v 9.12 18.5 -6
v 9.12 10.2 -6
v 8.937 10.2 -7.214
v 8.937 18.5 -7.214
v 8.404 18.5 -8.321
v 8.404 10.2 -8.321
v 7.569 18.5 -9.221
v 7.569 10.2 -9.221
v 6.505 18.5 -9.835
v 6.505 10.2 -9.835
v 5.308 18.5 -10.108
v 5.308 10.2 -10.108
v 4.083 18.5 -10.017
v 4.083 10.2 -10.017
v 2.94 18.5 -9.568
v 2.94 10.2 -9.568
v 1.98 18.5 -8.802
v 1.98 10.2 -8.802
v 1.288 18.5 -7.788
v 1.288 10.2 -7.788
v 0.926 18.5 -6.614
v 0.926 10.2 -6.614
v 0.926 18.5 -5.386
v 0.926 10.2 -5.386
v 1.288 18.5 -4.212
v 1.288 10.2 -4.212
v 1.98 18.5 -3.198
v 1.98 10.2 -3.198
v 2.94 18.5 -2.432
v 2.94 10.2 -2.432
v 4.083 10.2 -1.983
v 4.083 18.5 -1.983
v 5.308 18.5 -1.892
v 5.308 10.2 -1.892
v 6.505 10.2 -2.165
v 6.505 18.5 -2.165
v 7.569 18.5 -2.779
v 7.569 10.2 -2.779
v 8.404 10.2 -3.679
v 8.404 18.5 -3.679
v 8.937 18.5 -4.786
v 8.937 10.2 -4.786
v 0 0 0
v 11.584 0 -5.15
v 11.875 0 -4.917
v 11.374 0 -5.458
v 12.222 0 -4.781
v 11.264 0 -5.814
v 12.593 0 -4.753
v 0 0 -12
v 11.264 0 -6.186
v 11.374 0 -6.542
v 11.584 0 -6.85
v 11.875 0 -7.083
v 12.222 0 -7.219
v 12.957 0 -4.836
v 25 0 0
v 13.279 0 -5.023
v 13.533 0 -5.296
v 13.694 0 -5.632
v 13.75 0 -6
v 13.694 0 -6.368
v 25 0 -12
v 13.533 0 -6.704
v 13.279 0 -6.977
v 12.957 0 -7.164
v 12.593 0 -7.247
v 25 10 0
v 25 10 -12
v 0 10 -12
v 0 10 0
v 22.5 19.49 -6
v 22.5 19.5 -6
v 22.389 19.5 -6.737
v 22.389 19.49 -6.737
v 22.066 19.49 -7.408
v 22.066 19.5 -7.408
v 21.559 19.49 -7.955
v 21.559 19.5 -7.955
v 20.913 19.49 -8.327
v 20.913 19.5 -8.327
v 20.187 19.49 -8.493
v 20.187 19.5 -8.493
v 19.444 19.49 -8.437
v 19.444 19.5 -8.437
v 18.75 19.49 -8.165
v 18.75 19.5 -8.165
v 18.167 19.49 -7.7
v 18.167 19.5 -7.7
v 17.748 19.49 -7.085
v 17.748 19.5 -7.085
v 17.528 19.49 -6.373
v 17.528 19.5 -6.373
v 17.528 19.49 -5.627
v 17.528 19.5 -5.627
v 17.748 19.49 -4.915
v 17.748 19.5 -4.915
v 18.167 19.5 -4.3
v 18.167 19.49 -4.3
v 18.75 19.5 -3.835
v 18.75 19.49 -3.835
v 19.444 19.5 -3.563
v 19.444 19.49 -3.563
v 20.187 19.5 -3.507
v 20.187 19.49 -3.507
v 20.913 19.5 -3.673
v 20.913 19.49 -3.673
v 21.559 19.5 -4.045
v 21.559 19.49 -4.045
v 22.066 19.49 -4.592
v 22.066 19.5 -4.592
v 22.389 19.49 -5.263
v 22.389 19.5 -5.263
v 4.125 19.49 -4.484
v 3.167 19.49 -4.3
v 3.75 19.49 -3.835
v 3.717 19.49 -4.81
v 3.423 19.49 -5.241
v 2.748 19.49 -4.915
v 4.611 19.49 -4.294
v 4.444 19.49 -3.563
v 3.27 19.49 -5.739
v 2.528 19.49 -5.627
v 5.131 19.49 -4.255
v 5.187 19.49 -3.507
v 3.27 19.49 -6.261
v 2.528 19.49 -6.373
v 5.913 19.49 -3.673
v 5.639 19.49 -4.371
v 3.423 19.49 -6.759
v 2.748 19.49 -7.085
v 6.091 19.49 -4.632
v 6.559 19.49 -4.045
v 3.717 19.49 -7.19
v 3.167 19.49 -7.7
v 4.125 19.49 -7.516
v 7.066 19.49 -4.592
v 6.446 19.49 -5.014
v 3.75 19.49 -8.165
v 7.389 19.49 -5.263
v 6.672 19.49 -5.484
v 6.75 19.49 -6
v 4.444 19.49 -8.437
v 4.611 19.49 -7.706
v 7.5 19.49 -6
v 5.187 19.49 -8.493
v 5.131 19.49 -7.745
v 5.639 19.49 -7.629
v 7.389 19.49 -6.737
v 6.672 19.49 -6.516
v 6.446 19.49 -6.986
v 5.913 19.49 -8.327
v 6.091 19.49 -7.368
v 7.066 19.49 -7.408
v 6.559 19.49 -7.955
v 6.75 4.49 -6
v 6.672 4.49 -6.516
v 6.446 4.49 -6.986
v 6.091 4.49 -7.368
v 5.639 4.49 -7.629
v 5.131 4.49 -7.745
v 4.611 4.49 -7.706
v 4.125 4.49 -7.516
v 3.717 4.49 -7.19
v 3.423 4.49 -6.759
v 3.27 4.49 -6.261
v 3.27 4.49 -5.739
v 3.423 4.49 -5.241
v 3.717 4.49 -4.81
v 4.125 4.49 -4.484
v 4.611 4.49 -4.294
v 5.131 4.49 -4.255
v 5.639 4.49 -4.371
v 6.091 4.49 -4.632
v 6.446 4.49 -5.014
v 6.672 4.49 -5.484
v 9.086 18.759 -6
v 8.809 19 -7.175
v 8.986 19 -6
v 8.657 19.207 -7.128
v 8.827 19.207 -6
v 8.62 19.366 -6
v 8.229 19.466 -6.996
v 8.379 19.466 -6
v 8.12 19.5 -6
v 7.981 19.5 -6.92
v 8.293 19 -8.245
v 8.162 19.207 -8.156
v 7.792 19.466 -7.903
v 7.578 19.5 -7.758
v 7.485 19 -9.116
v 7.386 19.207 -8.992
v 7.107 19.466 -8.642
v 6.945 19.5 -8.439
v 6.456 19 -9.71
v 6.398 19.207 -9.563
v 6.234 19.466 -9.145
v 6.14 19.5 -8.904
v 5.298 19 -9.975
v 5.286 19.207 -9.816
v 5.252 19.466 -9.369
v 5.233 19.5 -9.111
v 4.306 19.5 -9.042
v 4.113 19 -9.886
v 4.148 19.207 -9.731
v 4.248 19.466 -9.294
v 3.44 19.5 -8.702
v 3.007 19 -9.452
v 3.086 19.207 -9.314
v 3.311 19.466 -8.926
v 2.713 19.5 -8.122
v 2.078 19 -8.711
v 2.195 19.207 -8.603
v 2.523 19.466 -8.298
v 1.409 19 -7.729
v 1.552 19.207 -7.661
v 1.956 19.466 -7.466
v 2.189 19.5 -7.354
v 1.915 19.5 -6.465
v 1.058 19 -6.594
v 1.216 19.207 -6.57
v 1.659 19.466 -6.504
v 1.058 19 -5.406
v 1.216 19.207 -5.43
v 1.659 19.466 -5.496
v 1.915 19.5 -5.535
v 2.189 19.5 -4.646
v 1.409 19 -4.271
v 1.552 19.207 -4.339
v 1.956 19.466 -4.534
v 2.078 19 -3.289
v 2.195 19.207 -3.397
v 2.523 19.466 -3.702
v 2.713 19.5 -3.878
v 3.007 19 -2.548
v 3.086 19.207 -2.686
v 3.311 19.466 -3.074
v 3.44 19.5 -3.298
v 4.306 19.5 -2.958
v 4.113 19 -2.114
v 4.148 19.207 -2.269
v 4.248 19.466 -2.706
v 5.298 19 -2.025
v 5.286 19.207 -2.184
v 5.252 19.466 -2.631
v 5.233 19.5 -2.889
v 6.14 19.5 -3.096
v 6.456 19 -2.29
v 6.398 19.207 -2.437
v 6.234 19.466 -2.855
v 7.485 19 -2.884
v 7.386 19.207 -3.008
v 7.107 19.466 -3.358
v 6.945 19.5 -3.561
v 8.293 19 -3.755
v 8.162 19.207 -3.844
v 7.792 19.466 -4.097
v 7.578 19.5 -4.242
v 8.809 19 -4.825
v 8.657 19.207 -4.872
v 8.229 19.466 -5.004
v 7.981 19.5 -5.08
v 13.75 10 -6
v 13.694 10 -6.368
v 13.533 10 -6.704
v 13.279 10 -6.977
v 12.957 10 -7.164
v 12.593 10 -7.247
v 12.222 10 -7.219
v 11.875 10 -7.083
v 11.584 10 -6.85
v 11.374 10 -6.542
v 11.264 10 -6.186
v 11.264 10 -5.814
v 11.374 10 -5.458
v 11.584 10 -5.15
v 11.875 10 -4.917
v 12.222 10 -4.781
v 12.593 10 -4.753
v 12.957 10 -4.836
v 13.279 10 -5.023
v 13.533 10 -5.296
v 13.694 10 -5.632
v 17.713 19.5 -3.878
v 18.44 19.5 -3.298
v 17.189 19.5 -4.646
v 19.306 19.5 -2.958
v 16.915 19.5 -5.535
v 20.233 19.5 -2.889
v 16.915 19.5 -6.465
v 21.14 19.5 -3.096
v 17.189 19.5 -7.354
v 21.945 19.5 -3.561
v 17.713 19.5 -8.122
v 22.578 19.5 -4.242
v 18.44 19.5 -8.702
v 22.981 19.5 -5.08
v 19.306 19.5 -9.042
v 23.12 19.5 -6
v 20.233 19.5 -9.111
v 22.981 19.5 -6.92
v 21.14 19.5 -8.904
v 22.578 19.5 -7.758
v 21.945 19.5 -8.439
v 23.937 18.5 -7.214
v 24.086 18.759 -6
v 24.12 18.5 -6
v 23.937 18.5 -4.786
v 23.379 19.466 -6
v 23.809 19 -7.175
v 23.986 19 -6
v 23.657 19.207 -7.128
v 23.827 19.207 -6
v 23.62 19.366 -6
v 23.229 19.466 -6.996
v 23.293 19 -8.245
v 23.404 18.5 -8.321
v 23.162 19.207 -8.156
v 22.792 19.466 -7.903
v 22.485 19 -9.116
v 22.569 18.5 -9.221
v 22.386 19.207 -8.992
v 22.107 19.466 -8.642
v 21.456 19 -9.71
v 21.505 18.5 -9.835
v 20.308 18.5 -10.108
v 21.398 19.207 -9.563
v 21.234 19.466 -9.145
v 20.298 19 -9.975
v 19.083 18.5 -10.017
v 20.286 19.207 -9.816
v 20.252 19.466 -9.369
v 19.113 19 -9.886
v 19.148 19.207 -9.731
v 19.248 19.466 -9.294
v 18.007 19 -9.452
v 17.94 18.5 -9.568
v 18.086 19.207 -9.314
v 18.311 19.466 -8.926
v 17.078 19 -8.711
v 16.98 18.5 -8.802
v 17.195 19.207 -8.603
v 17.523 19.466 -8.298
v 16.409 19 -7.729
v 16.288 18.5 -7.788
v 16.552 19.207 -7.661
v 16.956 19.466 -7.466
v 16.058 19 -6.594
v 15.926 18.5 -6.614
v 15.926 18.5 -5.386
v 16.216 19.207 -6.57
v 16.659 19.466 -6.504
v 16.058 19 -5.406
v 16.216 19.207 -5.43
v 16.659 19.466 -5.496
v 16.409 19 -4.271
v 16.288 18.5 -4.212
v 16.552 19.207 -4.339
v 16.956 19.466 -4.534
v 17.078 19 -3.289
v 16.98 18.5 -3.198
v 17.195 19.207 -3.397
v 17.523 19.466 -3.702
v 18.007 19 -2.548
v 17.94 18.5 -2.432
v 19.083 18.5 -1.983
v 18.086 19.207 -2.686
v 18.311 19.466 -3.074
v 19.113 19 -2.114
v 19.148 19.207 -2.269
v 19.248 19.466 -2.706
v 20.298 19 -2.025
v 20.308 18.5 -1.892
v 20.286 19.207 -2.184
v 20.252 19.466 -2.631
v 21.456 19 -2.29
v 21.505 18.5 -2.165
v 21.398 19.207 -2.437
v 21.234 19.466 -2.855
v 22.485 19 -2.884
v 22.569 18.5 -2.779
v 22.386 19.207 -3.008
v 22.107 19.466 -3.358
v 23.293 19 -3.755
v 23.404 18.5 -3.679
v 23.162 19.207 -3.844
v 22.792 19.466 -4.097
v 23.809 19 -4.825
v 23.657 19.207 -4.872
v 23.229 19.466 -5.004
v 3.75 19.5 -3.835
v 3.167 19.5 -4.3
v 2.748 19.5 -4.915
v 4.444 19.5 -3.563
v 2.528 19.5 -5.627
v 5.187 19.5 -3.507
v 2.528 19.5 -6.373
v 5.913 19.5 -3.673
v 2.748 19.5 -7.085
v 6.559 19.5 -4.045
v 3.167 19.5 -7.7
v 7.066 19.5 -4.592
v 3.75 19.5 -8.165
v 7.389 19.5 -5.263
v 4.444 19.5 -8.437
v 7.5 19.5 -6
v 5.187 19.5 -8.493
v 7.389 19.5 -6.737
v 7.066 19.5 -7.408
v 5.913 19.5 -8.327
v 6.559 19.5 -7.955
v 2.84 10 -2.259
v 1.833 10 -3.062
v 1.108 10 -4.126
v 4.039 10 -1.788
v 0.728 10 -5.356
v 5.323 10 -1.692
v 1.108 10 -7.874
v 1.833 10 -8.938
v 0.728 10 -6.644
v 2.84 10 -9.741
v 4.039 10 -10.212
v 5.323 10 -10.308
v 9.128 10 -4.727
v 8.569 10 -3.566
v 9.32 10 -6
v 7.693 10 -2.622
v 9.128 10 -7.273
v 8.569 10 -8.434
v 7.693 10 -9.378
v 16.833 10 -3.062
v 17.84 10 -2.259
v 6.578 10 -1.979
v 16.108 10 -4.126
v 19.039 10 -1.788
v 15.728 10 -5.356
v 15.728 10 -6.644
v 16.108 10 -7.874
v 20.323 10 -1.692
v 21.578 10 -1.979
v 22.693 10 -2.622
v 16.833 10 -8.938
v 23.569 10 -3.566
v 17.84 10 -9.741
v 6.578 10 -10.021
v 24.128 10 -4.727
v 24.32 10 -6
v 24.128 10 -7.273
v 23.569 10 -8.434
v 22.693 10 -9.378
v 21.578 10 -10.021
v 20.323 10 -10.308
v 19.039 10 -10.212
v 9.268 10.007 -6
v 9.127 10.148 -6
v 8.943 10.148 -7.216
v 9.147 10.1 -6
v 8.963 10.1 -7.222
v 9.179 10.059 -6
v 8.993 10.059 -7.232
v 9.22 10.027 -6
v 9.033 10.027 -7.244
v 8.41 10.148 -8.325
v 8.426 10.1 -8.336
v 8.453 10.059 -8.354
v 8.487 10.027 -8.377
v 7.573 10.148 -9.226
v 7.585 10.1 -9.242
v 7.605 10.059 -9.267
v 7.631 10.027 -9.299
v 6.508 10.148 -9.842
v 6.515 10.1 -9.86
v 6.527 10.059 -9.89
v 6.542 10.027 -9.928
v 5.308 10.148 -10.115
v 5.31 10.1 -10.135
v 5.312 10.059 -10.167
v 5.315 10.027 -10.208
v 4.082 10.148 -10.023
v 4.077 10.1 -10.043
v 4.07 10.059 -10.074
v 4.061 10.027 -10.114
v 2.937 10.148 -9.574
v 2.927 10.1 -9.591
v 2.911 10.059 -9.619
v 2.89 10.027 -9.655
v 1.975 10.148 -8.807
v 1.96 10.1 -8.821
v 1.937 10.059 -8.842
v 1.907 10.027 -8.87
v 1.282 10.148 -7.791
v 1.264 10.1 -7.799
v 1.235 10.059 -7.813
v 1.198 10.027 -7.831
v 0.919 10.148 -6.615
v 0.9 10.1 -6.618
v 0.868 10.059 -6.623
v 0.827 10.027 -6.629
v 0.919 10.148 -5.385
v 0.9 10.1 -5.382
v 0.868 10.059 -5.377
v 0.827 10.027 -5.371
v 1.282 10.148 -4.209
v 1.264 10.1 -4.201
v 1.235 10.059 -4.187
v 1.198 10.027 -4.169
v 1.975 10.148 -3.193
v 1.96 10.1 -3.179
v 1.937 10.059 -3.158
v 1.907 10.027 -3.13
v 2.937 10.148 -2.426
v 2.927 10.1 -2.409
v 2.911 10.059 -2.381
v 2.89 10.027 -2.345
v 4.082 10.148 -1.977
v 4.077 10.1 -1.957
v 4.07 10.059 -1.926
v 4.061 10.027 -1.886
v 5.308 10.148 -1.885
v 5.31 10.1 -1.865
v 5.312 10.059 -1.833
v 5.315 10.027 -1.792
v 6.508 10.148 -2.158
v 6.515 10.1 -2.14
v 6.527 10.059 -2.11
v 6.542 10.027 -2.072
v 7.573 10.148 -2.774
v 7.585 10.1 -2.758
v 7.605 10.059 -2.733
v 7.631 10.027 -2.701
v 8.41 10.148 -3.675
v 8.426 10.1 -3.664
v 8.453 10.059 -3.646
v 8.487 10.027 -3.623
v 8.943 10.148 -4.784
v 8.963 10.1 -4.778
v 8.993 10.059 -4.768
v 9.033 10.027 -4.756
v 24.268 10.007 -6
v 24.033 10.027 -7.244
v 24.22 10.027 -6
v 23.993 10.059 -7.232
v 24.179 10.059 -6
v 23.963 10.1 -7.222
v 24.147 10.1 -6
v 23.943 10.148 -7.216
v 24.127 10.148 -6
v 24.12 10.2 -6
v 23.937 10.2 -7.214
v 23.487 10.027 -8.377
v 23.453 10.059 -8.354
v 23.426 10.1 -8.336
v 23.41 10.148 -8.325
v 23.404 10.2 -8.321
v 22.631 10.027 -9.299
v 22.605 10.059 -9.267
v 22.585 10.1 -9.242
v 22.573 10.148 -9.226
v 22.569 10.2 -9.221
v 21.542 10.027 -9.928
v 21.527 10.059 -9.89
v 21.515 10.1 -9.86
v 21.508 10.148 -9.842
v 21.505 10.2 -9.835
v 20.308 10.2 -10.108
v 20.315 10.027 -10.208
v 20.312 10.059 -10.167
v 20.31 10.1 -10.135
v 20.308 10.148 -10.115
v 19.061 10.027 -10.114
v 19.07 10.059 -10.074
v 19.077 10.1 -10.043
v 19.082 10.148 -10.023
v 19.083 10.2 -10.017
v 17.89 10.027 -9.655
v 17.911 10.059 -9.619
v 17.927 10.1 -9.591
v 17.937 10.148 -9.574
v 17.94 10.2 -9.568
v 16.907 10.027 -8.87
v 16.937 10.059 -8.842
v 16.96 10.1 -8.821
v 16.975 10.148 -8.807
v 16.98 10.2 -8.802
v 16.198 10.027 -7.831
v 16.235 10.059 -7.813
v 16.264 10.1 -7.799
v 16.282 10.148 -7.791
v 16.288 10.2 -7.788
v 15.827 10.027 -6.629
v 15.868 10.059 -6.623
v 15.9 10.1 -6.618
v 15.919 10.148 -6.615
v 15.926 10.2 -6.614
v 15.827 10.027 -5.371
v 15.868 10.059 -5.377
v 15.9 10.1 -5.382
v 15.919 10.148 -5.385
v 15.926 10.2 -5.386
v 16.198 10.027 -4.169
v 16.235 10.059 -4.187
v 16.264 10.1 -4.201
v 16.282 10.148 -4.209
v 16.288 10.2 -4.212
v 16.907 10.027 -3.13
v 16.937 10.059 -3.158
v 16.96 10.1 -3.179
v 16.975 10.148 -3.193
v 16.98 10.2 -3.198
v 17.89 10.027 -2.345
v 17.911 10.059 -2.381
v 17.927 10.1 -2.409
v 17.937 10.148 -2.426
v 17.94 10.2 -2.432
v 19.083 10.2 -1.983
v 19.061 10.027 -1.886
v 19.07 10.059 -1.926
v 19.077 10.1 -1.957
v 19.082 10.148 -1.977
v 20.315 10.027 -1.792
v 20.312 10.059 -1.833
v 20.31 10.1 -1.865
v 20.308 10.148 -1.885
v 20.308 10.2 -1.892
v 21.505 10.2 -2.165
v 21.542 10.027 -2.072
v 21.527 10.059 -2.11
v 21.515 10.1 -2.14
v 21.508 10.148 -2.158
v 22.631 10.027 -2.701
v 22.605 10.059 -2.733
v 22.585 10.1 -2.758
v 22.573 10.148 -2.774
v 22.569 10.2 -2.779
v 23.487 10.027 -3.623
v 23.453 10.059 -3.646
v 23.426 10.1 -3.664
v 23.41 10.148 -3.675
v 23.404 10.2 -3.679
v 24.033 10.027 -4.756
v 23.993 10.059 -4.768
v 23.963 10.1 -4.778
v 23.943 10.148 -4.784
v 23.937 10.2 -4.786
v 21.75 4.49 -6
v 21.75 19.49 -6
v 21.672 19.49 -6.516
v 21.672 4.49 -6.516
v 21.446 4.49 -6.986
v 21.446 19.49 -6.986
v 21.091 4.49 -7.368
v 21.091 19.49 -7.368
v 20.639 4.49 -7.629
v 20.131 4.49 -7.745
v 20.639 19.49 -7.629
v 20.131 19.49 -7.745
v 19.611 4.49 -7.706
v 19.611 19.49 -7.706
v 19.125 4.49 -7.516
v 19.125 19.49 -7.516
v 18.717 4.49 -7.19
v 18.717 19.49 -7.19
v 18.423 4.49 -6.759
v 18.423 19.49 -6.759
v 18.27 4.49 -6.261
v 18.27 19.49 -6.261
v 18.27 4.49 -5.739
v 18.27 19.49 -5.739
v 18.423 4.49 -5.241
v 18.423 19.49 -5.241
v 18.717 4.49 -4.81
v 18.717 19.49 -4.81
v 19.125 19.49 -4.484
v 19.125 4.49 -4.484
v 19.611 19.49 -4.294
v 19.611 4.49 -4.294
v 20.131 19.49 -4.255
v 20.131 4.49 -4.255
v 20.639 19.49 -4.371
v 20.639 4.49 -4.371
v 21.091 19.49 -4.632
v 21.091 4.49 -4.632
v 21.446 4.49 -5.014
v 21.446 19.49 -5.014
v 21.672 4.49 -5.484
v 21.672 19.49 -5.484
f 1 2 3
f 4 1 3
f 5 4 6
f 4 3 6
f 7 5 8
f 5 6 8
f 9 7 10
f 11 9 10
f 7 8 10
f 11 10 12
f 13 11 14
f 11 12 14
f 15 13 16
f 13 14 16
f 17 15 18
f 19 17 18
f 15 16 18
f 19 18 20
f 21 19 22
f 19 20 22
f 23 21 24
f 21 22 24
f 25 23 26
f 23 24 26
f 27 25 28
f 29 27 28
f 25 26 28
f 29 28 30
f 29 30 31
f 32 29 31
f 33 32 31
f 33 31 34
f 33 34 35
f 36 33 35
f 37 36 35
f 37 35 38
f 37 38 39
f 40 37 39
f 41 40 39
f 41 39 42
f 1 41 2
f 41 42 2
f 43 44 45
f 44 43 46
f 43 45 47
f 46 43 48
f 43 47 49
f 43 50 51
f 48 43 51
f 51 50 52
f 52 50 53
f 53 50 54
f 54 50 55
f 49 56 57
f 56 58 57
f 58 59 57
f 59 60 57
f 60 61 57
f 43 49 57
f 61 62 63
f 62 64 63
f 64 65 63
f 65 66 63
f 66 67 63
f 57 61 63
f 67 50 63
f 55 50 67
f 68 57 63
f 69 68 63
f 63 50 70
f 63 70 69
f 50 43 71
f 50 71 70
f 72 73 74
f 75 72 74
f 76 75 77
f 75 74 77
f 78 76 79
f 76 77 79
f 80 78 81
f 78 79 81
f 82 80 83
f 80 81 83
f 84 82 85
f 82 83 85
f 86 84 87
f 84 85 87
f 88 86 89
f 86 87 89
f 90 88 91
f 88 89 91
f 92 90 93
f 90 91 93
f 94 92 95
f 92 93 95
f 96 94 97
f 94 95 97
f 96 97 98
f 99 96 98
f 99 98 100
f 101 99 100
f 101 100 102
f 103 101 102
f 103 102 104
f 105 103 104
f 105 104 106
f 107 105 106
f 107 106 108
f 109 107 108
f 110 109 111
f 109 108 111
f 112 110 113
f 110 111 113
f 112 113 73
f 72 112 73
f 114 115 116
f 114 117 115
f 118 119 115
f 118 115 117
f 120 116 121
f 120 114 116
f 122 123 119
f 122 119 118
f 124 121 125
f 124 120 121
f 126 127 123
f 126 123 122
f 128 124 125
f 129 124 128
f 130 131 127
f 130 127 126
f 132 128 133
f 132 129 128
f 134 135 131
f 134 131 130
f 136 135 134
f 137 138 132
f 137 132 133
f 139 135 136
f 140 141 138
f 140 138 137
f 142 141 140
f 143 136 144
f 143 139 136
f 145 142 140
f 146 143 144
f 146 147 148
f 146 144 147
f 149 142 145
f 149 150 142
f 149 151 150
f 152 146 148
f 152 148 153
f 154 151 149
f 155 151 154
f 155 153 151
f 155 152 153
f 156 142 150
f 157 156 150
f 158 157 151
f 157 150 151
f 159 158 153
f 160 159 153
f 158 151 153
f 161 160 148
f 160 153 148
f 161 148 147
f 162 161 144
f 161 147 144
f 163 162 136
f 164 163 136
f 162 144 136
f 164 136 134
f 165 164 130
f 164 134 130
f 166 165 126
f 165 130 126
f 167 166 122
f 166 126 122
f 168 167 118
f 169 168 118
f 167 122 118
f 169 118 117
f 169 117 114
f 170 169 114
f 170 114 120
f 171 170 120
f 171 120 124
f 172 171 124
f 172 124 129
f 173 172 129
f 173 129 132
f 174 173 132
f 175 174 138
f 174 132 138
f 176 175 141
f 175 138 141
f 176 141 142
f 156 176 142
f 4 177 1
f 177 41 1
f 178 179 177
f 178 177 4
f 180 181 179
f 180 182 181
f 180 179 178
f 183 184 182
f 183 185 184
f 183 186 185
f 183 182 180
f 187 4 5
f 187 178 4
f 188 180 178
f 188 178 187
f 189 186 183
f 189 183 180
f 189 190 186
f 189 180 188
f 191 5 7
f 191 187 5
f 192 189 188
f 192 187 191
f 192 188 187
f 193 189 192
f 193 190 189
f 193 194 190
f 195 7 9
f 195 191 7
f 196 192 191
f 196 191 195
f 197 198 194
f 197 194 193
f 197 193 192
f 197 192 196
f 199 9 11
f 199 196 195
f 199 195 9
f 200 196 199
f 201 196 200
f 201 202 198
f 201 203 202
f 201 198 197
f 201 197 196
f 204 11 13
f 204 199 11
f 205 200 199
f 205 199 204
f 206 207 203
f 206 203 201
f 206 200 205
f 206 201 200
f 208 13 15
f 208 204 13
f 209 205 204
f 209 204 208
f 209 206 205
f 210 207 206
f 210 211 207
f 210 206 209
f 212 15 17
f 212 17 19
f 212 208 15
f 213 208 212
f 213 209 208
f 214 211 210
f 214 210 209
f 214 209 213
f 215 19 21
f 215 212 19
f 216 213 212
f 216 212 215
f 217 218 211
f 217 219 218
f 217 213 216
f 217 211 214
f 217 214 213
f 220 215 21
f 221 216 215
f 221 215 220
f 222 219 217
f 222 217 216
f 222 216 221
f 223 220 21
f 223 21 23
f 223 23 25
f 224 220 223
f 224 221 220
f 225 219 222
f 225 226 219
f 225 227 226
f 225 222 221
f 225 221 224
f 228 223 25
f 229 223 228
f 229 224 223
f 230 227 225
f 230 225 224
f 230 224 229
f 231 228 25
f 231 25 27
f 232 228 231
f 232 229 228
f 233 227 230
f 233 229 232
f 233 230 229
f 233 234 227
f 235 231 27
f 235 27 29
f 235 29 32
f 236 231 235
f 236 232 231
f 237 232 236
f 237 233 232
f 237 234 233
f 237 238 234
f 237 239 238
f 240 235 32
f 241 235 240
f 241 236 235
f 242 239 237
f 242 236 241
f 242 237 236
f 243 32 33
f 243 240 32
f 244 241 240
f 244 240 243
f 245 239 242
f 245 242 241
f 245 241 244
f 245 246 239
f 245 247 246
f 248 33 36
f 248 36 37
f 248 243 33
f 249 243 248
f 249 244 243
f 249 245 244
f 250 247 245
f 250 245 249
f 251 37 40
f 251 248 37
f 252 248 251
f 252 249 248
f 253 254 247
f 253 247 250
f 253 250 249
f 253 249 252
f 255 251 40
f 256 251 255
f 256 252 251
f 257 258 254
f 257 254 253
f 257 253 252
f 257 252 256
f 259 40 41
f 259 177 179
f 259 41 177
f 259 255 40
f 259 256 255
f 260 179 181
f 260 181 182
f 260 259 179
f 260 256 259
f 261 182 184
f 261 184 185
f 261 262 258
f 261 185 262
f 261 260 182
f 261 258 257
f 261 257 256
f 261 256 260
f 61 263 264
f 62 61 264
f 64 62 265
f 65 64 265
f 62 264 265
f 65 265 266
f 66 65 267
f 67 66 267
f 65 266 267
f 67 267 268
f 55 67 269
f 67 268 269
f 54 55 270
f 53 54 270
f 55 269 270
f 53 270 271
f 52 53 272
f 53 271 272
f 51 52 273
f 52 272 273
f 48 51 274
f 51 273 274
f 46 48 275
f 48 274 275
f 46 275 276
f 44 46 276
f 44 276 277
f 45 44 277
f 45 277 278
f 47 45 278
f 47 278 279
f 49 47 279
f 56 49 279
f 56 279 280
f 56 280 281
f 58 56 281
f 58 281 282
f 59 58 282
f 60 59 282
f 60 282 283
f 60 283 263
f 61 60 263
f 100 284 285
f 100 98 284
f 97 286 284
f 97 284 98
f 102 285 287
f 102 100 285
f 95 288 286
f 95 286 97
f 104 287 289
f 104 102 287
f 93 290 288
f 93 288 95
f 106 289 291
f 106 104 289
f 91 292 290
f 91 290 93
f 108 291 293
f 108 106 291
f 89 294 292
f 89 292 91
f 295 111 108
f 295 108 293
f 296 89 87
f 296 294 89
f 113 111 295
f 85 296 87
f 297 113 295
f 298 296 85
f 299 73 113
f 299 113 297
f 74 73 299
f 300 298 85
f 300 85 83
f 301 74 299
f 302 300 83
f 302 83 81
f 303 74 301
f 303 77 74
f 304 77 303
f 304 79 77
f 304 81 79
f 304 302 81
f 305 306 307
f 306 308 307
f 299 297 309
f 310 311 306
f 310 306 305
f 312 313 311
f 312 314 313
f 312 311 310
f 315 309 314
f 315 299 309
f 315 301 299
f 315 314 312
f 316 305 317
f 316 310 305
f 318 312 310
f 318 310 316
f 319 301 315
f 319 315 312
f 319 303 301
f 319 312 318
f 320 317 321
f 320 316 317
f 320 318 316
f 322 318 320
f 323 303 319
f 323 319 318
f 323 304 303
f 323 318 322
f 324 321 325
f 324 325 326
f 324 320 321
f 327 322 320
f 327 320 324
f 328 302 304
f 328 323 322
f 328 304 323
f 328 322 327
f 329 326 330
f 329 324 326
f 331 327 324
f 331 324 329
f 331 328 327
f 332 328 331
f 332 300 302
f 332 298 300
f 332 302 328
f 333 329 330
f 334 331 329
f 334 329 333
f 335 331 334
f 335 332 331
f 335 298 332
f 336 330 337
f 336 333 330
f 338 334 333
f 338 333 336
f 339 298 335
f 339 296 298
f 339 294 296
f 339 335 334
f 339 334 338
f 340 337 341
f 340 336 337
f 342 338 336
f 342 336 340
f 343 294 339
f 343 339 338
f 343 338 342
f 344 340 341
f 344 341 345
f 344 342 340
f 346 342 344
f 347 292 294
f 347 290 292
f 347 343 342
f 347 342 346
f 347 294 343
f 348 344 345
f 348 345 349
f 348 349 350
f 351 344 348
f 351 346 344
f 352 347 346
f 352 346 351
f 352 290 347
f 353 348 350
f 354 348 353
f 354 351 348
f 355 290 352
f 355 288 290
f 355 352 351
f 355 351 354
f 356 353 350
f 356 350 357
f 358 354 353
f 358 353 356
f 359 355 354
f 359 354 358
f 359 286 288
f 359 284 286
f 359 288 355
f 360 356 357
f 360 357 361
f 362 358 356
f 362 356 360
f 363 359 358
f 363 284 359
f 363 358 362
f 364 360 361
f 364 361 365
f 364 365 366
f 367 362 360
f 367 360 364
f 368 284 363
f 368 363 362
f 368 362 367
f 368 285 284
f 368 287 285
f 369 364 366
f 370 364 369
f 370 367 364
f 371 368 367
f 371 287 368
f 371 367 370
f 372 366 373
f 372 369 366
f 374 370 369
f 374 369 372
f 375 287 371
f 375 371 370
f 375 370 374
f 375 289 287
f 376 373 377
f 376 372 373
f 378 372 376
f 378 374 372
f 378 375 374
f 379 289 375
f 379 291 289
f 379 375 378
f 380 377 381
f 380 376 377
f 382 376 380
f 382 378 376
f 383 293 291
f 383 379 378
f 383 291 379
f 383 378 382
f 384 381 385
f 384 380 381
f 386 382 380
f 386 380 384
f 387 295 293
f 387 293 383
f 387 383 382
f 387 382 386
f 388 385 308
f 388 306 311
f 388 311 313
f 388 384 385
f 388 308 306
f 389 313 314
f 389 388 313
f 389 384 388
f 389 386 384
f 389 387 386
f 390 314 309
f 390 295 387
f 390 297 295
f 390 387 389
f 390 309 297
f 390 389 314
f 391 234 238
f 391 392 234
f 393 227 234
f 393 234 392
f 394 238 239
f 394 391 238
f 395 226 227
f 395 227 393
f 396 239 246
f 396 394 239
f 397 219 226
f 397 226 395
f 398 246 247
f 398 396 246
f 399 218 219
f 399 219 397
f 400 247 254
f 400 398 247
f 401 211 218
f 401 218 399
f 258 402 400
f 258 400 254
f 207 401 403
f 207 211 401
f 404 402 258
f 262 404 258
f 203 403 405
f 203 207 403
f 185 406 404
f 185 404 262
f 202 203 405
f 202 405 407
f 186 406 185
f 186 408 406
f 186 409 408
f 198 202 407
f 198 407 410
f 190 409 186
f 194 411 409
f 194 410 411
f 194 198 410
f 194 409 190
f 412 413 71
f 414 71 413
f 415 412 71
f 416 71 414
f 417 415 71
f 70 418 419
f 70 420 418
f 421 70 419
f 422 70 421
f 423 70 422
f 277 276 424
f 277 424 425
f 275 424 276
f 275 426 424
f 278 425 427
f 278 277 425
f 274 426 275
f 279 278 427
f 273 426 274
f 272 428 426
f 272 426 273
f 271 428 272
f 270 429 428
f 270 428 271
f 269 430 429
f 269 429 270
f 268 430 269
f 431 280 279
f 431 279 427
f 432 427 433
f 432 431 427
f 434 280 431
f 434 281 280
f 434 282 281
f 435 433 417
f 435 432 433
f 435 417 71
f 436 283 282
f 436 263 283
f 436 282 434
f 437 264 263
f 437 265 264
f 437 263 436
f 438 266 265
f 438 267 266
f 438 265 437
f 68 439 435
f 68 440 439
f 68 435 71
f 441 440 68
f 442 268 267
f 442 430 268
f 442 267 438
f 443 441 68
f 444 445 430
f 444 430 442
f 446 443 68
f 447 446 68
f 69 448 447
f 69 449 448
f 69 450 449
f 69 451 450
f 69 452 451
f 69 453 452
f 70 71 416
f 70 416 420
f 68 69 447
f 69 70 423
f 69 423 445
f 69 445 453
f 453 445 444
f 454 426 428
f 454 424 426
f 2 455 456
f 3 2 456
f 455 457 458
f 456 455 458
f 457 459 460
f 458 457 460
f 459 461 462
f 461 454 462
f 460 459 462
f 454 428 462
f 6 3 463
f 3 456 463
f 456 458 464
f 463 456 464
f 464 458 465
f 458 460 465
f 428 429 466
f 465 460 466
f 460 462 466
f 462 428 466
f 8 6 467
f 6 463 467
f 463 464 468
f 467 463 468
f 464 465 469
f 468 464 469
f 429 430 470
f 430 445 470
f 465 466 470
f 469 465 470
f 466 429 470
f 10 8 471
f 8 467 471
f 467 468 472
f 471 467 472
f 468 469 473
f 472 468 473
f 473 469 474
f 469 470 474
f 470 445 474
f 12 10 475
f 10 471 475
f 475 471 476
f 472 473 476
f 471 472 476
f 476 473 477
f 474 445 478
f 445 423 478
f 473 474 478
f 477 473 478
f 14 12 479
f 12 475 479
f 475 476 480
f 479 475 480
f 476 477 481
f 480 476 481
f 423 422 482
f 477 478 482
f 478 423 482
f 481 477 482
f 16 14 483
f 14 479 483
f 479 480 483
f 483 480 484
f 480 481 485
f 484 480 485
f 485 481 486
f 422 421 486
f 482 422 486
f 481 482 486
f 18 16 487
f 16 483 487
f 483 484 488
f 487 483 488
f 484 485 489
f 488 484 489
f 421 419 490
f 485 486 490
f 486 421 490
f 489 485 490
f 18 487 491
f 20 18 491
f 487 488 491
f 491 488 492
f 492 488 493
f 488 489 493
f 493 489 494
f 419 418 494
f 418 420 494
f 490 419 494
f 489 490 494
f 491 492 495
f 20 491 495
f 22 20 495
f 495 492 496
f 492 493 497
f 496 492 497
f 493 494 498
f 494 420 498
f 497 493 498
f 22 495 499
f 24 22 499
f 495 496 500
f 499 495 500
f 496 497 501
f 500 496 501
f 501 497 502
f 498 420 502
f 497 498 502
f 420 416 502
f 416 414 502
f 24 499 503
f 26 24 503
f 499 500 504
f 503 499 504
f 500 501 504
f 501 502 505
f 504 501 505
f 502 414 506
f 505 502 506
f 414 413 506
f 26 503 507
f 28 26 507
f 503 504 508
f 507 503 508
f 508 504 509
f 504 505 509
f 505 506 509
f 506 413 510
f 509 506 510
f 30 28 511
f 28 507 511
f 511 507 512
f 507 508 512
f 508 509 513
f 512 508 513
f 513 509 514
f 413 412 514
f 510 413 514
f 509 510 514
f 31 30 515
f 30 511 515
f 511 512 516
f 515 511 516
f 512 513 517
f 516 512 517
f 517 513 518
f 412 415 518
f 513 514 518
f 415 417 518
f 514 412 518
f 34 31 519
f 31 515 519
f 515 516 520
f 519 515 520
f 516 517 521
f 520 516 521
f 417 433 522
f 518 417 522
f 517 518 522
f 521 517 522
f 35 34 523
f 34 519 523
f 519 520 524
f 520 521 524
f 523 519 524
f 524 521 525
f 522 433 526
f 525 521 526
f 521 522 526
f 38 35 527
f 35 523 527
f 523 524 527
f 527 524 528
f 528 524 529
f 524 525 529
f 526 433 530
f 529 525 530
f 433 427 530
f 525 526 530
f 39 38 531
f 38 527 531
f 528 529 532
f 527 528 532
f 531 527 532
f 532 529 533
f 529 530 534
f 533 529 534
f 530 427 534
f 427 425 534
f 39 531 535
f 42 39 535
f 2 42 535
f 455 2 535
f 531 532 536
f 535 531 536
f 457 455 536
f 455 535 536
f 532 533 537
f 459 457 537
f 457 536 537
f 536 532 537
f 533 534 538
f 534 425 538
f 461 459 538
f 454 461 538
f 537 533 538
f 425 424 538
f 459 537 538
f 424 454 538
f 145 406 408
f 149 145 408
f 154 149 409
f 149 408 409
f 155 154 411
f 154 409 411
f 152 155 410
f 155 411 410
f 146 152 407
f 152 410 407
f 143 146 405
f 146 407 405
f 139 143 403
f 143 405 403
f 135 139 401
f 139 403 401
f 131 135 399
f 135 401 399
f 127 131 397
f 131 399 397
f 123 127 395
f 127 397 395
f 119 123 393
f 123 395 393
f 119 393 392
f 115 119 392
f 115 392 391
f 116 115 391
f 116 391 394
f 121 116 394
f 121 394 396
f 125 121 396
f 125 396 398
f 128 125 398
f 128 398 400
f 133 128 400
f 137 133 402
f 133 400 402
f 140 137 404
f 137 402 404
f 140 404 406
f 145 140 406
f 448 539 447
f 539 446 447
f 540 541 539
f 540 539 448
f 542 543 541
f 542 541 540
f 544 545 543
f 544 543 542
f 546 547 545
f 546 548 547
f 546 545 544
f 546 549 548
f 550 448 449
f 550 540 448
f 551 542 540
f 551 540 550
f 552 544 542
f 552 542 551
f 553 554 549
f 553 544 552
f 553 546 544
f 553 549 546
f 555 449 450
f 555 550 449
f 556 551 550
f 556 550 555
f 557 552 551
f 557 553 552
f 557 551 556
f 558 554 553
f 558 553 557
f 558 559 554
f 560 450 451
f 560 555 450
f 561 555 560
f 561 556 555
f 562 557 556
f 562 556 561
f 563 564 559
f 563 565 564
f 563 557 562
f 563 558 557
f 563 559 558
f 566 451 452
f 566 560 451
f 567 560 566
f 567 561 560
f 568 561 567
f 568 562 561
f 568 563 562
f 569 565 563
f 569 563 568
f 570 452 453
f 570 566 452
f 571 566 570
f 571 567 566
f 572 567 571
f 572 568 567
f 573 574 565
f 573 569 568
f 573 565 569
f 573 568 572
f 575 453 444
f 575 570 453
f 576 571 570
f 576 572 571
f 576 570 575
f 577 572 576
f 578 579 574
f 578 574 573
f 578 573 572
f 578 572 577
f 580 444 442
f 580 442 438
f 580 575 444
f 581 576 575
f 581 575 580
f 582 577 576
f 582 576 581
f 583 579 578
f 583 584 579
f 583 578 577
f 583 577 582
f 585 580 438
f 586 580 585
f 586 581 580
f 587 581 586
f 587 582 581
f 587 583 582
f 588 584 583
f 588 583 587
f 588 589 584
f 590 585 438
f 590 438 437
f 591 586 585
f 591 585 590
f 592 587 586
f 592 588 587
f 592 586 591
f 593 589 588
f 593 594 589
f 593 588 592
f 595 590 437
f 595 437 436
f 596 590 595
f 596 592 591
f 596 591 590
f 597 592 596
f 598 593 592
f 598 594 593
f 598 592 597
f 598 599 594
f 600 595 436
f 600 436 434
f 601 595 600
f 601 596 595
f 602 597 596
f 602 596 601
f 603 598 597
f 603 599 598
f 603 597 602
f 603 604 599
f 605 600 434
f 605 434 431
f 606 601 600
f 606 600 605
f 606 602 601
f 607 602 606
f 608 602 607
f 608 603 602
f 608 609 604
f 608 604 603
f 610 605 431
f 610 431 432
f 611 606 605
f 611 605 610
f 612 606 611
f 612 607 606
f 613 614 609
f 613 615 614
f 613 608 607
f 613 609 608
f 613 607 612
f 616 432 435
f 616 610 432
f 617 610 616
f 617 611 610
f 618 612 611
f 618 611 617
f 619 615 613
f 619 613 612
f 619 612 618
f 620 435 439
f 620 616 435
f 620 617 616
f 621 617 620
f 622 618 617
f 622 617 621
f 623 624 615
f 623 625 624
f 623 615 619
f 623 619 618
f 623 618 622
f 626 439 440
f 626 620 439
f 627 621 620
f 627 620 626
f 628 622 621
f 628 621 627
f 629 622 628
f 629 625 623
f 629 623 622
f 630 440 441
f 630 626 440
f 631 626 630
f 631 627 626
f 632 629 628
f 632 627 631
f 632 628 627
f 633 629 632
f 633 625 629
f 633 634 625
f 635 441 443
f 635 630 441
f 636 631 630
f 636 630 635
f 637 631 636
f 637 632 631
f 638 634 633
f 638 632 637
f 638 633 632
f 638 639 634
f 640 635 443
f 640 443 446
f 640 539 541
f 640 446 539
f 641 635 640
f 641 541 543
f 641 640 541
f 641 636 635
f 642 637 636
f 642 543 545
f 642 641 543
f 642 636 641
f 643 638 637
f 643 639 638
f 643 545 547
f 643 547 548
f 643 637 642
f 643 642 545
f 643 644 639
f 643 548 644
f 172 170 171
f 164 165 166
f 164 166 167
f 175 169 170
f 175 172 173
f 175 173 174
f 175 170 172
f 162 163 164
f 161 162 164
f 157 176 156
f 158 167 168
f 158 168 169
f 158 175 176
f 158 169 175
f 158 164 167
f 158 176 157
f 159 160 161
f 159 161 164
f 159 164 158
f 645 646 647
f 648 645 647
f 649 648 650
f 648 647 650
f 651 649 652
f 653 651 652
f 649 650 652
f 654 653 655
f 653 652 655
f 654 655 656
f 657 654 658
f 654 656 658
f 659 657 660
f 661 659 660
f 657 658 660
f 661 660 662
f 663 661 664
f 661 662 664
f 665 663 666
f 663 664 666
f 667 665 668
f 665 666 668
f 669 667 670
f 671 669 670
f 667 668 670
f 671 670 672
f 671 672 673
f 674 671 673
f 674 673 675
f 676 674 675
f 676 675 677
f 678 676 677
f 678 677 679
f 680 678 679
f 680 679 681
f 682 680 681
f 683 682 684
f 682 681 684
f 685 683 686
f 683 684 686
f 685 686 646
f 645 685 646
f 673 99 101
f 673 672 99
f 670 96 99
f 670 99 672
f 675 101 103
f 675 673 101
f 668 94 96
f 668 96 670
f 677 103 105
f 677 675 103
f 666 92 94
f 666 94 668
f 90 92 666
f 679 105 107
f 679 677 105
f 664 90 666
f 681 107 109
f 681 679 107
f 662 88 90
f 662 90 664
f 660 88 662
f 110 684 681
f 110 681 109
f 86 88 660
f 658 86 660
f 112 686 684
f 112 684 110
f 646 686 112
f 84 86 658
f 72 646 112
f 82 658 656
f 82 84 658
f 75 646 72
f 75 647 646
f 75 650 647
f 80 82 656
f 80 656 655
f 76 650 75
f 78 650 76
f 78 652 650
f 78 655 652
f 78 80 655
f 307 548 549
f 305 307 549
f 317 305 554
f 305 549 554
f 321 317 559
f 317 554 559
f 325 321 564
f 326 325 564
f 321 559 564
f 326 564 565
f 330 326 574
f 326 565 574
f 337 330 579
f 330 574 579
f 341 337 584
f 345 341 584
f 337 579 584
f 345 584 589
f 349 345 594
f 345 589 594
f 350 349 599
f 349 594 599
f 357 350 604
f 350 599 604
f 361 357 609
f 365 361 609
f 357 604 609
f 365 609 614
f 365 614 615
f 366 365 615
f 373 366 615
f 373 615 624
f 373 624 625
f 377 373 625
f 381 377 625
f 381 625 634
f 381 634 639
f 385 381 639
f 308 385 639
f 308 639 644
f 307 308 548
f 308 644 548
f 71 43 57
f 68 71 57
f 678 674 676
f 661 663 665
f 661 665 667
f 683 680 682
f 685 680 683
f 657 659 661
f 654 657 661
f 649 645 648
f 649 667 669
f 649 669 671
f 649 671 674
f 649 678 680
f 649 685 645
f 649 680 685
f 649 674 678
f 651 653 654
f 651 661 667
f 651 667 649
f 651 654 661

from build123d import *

# Parameters (mm, degrees)
ESQUISSE1_W             = 25
ESQUISSE1_H             = 12
BOSS_EXTRU_1_DEPTH      = 10
ESQUISSE2_R             = 4.12
BOSS_EXTRU_2_DEPTH      = 9.5
ESQUISSE3_R             = 2.5
ENL_V_MAT_EXTRU_1_DEPTH = 0.01
ESQUISSE4_R             = 1.75
ENL_V_MAT_EXTRU_2_DEPTH = 15
ESQUISSE5_R             = 1.25
ENL_V_MAT_EXTRU_3_DEPTH = 11
CONG_1_R                = 1
CONG_2_R                = 0.2


with BuildPart() as part:
    # Esquisse1 → Boss.-Extru.1 (new body)
    with BuildSketch(Plane(origin=(0, 0, 0), x_dir=(1, 0, 0), z_dir=(0, 1, 0))):
        with Locations((12.5, 6)):
            Rectangle(ESQUISSE1_W, ESQUISSE1_H)
    extrude(amount=BOSS_EXTRU_1_DEPTH)

    # Esquisse2 → Boss.-Extru.2 (add)
    with BuildSketch(Plane(origin=(0, 10, 0), x_dir=(1, 0, 0), z_dir=(0, 1, 0))):
        with Locations((5, 6)):
            Circle(ESQUISSE2_R)
        with Locations((20, 6)):
            Circle(ESQUISSE2_R)
    extrude(amount=BOSS_EXTRU_2_DEPTH)

    # Esquisse3 → Enlèv. mat.-Extru.1 (cut)
    with BuildSketch(Plane(origin=(0, 19.5, 0), x_dir=(1, 0, 0), z_dir=(0, 1, 0))):
        with Locations((5, 6)):
            Circle(ESQUISSE3_R)
        with Locations((20, 6)):
            Circle(ESQUISSE3_R)
    extrude(amount=-ENL_V_MAT_EXTRU_1_DEPTH, mode=Mode.SUBTRACT)

    # Esquisse4 → Enlèv. mat.-Extru.2 (cut)
    with BuildSketch(Plane(origin=(0, 19.49, 0), x_dir=(1, 0, 0), z_dir=(0, 1, 0))):
        with Locations((5, 6)):
            Circle(ESQUISSE4_R)
        with Locations((20, 6)):
            Circle(ESQUISSE4_R)
    extrude(amount=-ENL_V_MAT_EXTRU_2_DEPTH, mode=Mode.SUBTRACT)

    # Esquisse5 → Enlèv. mat.-Extru.3 (cut, through all)
    with BuildSketch(Plane(origin=(0, 10, 0), x_dir=(1, 0, 0), z_dir=(0, 1, 0))):
        with Locations((12.5, 6)):
            Circle(ESQUISSE5_R)
    extrude(amount=-ENL_V_MAT_EXTRU_3_DEPTH, mode=Mode.SUBTRACT)

    # Congé1
    cong_1_edges = [part.edges().sort_by_distance(p)[0] for p in [
        (0.88, 19.5, -6),
        (15.88, 19.5, -6),
    ]]
    fillet(cong_1_edges, radius=CONG_1_R)

    # Congé2
    cong_2_edges = [part.edges().sort_by_distance(p)[0] for p in [
        (0.88, 10, -6),
        (15.88, 10, -6),
    ]]
    fillet(cong_2_edges, radius=CONG_2_R)


solid = part.part
